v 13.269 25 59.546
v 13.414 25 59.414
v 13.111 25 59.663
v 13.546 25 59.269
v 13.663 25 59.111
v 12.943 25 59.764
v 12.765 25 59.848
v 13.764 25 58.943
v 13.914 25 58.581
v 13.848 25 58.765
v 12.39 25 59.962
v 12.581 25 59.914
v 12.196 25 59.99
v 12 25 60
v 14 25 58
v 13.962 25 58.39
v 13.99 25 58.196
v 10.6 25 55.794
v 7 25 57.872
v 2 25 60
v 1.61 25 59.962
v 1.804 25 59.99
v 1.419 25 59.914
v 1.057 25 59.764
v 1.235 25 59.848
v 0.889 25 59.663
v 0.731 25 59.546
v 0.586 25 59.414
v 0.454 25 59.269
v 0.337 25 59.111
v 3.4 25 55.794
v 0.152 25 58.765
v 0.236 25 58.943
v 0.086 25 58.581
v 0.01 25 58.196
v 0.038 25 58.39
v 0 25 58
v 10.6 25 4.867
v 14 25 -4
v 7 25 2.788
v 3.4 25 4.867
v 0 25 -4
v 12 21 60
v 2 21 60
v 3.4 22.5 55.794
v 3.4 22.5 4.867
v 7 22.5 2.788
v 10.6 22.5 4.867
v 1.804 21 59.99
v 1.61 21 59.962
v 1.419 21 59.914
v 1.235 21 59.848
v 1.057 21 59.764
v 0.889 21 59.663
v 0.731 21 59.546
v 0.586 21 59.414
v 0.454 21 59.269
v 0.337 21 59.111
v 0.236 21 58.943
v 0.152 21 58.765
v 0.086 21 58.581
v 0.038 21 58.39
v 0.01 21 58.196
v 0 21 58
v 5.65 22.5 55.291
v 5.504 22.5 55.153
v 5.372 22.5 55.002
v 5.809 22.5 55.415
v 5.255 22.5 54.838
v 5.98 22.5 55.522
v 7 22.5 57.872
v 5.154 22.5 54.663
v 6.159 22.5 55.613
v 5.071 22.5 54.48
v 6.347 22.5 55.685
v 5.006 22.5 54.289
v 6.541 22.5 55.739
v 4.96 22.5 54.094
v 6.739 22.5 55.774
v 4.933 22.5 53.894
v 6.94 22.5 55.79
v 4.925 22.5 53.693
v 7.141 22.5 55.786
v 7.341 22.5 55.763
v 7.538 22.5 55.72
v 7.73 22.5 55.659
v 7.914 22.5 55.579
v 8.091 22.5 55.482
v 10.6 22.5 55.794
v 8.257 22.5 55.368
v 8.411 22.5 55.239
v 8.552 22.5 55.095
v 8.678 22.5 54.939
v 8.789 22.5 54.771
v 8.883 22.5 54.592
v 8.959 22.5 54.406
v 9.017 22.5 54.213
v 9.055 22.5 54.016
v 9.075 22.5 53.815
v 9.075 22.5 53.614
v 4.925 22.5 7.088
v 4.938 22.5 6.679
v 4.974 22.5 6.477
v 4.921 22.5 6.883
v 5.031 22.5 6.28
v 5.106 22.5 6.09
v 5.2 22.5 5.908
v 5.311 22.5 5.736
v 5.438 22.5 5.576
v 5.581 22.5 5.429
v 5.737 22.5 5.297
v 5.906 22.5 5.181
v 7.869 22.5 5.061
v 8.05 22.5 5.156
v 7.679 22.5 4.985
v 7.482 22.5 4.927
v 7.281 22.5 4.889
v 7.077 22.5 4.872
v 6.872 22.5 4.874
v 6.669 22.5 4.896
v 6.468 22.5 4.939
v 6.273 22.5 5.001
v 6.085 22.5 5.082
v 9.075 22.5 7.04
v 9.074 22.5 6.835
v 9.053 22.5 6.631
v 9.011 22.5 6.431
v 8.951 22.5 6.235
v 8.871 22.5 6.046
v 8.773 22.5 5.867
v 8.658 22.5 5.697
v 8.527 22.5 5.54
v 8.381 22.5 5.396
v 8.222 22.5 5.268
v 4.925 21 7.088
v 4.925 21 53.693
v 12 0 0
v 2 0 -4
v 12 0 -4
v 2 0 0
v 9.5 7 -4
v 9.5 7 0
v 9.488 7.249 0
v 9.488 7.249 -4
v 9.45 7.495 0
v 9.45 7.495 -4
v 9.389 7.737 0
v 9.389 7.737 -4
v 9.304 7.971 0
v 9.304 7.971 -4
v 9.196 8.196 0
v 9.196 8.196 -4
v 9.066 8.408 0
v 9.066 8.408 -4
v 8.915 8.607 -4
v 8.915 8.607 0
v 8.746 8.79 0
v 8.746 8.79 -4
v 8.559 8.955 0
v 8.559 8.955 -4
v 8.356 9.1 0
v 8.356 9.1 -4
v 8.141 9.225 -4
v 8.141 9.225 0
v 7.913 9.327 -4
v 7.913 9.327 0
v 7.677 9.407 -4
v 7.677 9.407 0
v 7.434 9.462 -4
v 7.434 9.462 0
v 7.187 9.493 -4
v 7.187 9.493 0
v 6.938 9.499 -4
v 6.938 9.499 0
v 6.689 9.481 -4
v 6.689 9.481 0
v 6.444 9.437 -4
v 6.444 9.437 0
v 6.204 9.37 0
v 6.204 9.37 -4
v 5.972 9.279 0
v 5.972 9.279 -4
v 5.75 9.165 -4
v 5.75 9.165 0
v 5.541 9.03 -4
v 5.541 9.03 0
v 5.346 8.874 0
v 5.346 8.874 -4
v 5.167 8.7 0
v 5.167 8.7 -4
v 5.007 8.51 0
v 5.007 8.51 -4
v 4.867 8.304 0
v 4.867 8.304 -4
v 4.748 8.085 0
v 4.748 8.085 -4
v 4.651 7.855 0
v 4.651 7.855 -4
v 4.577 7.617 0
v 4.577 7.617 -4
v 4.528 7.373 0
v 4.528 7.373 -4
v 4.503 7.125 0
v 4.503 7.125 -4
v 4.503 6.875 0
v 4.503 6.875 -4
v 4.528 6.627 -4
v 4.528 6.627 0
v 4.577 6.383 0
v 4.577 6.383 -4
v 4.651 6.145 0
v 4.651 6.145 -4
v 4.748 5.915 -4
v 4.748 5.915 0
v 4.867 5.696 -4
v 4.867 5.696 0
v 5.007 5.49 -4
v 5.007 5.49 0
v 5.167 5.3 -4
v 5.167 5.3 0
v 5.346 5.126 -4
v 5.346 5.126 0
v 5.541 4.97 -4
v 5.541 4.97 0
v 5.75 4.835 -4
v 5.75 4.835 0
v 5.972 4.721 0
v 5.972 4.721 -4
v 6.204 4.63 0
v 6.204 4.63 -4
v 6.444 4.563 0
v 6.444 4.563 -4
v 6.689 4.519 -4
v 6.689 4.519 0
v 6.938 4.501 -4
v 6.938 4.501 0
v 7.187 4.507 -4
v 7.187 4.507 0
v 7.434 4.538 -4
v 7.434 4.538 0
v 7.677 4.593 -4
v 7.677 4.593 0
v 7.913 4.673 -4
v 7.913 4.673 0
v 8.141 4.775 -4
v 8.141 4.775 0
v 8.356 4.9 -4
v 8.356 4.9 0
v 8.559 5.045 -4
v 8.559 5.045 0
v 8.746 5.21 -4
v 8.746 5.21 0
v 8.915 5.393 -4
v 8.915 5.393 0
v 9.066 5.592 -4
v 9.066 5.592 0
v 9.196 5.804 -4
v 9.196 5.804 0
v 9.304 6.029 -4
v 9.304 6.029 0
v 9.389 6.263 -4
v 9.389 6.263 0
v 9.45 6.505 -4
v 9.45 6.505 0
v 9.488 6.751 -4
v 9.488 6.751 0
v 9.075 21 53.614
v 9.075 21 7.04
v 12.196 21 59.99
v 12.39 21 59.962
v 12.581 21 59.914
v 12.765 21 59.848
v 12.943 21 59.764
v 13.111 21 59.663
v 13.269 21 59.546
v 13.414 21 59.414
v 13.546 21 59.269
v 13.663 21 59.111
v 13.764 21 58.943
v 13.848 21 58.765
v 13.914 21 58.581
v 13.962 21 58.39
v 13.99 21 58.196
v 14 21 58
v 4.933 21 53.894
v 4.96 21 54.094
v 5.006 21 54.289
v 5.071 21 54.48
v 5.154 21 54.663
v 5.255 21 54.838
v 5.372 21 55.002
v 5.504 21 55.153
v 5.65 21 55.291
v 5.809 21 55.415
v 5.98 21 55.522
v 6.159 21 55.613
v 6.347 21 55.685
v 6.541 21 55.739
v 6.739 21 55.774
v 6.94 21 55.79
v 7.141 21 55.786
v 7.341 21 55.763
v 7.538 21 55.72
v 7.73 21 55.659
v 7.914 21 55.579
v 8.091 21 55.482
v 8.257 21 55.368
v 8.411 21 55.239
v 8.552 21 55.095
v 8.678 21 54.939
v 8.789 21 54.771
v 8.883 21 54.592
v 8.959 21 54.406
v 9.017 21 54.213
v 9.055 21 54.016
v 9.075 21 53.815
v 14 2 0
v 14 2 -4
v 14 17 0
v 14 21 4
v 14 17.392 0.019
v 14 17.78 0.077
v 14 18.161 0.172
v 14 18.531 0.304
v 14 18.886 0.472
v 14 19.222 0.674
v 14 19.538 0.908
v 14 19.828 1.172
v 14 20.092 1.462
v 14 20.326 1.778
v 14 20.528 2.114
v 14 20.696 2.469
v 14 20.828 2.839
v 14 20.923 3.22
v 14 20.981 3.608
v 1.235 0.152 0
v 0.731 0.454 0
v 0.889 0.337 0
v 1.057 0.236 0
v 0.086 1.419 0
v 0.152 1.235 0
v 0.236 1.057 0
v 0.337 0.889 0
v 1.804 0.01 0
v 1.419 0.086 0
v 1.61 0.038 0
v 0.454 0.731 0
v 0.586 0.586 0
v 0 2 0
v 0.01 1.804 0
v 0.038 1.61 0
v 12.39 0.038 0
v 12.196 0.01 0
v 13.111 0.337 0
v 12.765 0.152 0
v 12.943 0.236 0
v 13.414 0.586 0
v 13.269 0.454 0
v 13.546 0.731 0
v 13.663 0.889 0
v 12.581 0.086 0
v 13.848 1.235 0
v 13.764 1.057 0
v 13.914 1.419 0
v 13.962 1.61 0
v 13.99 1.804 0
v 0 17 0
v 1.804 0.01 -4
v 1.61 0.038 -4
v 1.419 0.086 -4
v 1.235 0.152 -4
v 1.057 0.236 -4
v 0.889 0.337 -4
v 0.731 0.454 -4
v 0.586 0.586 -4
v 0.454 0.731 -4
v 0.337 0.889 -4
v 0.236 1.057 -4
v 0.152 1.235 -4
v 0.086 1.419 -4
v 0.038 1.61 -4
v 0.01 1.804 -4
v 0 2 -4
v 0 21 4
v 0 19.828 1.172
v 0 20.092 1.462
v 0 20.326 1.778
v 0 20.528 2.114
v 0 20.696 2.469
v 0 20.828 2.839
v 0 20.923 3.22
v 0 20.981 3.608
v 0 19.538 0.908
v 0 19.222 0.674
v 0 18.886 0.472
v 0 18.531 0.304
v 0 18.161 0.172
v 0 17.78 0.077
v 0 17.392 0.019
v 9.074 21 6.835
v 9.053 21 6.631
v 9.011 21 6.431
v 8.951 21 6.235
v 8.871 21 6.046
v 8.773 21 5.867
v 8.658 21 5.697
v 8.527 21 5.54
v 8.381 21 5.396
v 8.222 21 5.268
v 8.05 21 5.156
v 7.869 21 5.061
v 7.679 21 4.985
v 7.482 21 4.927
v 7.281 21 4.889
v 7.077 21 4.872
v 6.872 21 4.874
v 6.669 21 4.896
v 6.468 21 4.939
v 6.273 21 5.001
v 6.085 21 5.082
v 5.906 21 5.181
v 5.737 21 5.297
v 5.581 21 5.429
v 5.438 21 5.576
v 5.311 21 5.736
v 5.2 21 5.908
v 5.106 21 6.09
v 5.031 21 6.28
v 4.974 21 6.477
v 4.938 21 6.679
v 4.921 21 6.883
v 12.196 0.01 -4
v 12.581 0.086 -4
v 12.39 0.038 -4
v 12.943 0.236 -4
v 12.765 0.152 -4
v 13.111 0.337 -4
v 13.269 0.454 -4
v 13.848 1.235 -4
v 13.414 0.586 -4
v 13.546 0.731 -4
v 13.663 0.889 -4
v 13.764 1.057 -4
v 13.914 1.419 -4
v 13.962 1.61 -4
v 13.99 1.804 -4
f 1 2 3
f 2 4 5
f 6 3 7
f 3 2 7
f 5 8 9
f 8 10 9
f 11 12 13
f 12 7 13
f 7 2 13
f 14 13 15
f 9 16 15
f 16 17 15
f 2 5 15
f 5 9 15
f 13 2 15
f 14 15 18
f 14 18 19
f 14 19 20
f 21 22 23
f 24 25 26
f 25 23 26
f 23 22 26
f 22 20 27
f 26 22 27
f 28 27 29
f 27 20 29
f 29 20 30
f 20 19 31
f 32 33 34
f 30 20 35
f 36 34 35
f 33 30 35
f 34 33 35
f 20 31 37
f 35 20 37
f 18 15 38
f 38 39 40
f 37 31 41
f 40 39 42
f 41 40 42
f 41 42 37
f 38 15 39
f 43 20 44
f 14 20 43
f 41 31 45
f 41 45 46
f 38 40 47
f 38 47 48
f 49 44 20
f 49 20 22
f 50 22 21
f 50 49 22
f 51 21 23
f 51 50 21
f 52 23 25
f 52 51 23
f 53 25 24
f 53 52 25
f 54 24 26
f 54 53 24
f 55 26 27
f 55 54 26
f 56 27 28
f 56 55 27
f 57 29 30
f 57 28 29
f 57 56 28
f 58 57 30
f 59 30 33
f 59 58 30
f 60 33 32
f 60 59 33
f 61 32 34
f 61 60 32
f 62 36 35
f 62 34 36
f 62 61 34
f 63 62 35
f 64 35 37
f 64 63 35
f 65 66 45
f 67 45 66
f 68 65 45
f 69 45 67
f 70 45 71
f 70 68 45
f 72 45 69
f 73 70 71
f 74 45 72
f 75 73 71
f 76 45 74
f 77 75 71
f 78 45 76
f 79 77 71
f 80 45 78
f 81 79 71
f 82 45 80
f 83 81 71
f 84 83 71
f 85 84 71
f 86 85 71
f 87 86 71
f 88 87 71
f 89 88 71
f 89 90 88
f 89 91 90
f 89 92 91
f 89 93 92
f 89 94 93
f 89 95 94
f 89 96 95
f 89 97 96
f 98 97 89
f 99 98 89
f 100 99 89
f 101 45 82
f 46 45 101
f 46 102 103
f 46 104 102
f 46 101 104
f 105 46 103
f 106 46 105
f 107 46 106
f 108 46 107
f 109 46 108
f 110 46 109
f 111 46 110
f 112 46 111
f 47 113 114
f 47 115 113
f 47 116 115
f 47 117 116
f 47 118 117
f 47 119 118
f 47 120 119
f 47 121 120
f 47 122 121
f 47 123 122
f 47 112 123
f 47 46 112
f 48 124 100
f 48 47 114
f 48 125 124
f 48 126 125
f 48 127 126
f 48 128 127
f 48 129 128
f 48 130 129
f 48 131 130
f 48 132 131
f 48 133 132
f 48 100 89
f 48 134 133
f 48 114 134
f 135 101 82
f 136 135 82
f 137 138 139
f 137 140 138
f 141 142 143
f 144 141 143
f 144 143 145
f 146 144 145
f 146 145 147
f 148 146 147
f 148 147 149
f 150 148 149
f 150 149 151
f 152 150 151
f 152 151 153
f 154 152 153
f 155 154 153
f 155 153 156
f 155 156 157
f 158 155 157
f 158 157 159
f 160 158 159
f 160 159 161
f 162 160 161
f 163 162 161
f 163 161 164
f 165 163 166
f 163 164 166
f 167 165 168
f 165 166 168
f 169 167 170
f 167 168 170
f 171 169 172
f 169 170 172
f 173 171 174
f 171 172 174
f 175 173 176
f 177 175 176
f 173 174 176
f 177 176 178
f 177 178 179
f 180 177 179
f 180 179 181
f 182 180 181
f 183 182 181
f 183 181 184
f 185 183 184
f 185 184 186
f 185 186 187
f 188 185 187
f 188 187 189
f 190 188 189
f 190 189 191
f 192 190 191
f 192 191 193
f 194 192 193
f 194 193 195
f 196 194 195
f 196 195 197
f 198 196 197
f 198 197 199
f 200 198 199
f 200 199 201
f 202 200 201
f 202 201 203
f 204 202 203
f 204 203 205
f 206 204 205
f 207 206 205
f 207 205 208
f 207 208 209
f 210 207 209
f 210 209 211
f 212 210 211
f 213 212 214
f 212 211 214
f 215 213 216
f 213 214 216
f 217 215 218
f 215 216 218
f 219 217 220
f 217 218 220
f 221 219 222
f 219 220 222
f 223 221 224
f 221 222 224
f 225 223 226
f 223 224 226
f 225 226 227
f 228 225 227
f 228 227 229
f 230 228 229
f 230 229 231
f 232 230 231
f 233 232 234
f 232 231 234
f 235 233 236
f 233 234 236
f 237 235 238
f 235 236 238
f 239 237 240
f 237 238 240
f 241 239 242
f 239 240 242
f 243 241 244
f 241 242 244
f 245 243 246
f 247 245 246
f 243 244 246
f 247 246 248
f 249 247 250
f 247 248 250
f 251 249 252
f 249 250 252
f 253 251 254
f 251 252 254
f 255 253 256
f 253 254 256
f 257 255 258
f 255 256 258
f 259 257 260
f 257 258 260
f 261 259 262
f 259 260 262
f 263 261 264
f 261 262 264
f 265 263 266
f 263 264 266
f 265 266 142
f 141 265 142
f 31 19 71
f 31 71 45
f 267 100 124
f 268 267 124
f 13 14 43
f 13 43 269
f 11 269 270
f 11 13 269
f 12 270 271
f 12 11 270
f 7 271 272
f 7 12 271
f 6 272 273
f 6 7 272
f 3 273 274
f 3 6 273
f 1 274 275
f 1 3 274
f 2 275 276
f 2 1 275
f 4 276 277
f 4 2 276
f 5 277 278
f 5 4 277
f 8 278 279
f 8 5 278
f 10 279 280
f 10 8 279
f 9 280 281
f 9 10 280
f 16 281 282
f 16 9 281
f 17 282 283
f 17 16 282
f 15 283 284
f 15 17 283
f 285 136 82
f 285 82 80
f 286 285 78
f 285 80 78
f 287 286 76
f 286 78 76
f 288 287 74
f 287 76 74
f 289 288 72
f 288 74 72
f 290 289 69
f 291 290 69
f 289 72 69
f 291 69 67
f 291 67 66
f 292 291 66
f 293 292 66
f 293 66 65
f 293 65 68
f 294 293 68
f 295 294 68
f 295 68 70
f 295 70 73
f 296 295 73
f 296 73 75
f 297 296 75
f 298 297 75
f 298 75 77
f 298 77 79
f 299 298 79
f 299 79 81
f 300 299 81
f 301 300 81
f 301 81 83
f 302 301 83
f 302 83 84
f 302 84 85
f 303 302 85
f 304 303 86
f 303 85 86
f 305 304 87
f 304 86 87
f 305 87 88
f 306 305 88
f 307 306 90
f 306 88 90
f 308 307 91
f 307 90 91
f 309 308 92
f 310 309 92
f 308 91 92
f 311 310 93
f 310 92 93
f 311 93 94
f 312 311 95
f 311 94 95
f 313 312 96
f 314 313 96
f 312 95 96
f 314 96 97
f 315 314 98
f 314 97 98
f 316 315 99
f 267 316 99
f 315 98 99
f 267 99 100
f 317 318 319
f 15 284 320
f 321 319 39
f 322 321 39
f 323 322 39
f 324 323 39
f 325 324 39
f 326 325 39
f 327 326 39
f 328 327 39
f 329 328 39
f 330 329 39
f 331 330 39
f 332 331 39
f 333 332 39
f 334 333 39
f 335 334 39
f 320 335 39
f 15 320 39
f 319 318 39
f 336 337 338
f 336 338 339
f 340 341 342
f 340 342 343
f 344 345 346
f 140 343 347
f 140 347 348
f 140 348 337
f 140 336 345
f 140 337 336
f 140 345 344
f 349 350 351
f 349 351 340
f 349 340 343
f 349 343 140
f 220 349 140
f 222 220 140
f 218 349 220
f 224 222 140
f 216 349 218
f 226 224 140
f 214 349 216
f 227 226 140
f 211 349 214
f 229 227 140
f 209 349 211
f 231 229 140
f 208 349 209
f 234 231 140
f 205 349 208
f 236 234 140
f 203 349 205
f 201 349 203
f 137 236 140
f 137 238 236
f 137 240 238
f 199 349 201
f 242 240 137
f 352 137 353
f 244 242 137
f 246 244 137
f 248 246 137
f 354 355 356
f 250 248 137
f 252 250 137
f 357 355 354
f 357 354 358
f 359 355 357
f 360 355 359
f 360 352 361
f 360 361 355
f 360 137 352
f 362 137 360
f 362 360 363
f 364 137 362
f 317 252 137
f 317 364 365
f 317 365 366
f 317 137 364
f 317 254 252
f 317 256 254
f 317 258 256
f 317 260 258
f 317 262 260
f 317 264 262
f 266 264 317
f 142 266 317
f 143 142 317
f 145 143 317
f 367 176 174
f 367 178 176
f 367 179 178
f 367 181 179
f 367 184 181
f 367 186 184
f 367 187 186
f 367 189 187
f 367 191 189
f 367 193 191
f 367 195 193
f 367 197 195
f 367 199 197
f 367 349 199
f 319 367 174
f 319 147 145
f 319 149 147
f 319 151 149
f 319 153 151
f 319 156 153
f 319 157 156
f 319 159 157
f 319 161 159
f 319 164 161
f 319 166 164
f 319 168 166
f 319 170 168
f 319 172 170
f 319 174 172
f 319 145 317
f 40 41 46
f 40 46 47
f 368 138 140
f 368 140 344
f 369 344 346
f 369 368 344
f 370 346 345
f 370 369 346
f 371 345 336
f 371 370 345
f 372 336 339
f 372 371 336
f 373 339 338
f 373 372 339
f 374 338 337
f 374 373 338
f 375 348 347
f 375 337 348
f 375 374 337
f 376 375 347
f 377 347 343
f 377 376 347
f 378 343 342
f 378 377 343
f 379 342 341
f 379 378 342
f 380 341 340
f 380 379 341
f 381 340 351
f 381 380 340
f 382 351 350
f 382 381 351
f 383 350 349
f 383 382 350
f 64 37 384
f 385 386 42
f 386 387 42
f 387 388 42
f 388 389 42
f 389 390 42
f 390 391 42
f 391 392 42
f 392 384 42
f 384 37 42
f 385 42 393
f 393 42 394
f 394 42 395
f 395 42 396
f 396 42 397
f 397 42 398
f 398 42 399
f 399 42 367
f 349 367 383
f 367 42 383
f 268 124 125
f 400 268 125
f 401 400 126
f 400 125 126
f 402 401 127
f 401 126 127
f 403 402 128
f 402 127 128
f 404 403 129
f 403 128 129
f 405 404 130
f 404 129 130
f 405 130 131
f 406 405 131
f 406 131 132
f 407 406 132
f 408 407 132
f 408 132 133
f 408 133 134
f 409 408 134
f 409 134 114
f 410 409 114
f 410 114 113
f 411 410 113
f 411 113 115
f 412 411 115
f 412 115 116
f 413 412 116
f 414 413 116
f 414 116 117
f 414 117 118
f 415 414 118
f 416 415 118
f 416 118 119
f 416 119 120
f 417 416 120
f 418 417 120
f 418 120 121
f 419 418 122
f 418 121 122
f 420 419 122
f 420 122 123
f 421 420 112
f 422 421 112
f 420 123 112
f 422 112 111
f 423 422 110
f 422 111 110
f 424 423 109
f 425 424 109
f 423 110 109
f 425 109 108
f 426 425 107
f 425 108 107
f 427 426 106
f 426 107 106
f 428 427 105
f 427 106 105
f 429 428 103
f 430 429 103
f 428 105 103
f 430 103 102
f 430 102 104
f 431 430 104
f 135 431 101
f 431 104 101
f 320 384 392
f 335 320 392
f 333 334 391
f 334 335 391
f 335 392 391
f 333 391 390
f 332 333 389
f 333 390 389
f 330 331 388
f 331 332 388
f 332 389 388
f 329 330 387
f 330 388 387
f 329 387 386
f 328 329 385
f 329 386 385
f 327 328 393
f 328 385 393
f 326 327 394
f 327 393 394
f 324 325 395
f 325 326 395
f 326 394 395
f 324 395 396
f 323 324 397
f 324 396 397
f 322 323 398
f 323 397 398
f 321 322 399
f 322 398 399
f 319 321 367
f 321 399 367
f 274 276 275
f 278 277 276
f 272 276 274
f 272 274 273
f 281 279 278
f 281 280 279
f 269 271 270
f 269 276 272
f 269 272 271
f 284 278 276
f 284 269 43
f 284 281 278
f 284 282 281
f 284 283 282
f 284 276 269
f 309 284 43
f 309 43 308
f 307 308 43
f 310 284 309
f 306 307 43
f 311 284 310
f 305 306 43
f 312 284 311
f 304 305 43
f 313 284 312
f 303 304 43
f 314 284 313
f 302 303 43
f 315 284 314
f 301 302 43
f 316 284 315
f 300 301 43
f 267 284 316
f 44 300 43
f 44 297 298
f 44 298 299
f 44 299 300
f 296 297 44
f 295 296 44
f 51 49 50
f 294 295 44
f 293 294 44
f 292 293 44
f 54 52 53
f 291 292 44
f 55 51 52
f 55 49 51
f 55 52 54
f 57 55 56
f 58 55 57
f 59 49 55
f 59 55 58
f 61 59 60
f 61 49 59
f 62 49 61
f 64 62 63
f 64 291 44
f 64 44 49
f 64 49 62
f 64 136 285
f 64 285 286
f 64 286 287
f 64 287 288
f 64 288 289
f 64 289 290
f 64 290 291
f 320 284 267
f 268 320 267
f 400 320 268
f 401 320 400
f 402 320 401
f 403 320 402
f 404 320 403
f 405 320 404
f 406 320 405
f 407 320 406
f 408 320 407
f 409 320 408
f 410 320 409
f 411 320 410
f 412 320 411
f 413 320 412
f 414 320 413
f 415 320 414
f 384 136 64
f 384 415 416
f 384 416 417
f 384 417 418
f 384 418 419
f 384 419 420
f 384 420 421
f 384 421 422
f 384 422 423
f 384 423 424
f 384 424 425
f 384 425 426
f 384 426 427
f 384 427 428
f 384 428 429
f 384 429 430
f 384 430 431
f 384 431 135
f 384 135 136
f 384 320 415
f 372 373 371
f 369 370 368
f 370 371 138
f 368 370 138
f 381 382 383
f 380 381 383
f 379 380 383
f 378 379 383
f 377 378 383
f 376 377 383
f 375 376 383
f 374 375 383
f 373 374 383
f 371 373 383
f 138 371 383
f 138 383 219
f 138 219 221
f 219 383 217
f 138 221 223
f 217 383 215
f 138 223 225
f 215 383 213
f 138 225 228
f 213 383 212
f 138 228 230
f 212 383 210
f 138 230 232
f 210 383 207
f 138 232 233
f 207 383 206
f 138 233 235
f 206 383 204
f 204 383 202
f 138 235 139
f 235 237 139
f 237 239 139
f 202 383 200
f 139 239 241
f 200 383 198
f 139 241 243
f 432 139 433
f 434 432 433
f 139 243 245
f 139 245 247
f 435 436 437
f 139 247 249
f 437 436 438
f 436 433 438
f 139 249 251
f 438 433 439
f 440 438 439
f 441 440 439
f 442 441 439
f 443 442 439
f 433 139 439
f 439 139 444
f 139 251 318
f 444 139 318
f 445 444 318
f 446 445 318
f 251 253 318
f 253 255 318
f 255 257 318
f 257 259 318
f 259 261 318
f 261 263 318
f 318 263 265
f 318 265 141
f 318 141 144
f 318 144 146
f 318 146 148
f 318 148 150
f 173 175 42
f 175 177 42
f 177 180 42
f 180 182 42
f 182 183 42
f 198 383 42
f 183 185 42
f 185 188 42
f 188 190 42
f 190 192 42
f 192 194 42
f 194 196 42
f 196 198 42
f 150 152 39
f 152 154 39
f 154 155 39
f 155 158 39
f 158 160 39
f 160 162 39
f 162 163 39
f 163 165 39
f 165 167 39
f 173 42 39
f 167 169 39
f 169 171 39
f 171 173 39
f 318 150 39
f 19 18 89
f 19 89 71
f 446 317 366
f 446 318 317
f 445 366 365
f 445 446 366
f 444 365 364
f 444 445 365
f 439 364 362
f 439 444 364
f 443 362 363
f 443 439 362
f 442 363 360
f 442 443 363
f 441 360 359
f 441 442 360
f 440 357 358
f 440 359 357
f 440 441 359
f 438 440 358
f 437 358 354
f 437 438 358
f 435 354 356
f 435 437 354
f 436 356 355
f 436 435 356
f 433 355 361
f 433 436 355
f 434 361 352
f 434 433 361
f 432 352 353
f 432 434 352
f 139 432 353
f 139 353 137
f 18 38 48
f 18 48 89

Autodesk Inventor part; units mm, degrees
ref_plane "YZ Plane" through (0, 0, 0) normal (1, 0, 0) x (0, 1, 0)
ref_plane "XZ Plane" through (0, 0, 0) normal (0, 1, 0) x (-1, 0, 0)
ref_plane "XY Plane" through (0, 0, 0) normal (0, 0, 1) x (1, 0, 0)
sketch "Náčrt1" plane through (0, 0, 0) normal (0, 0, 1) x (1, 0, 0)
  line L0 (0, 0) -> (14, 0)
  line L1 (14, 0) -> (14, 25)
  line L2 (14, 25) -> (0, 25)
  line L3 (0, 25) -> (0, 0)
  circle A0 centre (7, 7) radius 2.5
  line L4 (0, 25) -> (14, 25)
  line L5 (14, 25) -> (14, 21)
  line L6 (14, 21) -> (0, 21)
  line L7 (0, 21) -> (0, 25)
  point P0 (0, 0)
  point P1 (7, 0)
  point P2 (0, 21)
  dimension "d0" = 14
  dimension "d1" = 25
  dimension "d2" = 5
  dimension "d3" = 7
  dimension "d4" = 7
  dimension "d5" = 4
extrude "Vysunutí1" add sketch "Náčrt1" against normal blind 4
extrude "Vysunutí2" add sketch "Náčrt1" along normal blind 60 contours L3 L2 L1 L6
sketch "Náčrt2" plane through (0, 25, -4) normal (0, 1, 0) x (1, 0, 0)
  point P0 (0, -4)
sketch "Náčrt3" plane through (0, 25, -4) normal (0, 1, 0) x (1, 0, 0)
  line L0 (14, 0) -> (14, -64) projected
  line L1 (0, 0) -> (14, 0) projected
  line L2 (0, 0) -> (0, -64) projected
  line L3 (14, -64) -> (0, -64) projected
  line L4 (7, -6.7883) -> (10.6, -8.8668)
  line L5 (9.075, -57.6142) -> (9.075, -11.0396)
  line L6 (10.6, -59.7938) -> (7, -61.8722)
  line L7 (7, -61.8722) -> (3.4, -59.7938)
  line L8 (7, -61.8722) -> (3.4, -59.7938)
  line L9 (10.6, -59.7938) -> (7, -61.8722)
  line L10 (7, -6.7883) -> (10.6, -8.8668)
  arc A0 (4.925, -57.693) -> (9.075, -57.6142) centre (7.0012, -57.7147) ccw
  arc A1 (4.925, -57.693) -> (9.075, -57.6142) centre (7.0012, -57.7147) ccw
  line L11 (4.925, -11.0876) -> (4.925, -57.693)
  line L12 (9.075, -57.6142) -> (9.075, -11.0396)
  line L13 (10.6, -8.8668) -> (10.6, -59.7938)
  line L14 (10.6, -8.8668) -> (10.6, -59.7938)
  line L15 (3.4, -59.7938) -> (3.4, -8.8668)
  line L16 (3.4, -59.7938) -> (3.4, -8.8668)
  arc A2 (9.075, -11.0396) -> (4.925, -11.0876) centre (6.9987, -10.9484) ccw
  arc A3 (9.075, -11.0396) -> (4.925, -11.0876) centre (6.9987, -10.9484) ccw
  line L17 (3.4, -8.8668) -> (7, -6.7883)
  line L18 (3.4, -8.8668) -> (7, -6.7883)
  line L19 (4.925, -11.0876) -> (4.925, -57.693)
  point P0 (0, -4)
  point P1 (7, -8.87)
  point P2 (7, -8.87)
  point P3 (7, -64)
  point P4 (7.0406, -59.7906)
  dimension "d10" = 4.15
  dimension "d11" = 2.1278
  dimension "d12" = 2.0816
  dimension "d13" = 1.525
extrude "Vysunutí3" cut sketch "Náčrt3" against normal blind 60 contours A0 L11 A2 L5
extrude "Vysunutí4" cut sketch "Náčrt3" against normal blind 2.5 contours L4 L13 L6 L7 L15 L17
fillet "Zaoblení1" radius 2 2 edges at (14, 23, 60) (0, 23, 60)
fillet "Zaoblení2" radius 2 2 edges at (14, 0, -2) (0, 0, -2)
fillet "Zaoblení3" radius 4 1 edges at (7, 21, 0)
properties part number "Sloupek" material "Olovo"
